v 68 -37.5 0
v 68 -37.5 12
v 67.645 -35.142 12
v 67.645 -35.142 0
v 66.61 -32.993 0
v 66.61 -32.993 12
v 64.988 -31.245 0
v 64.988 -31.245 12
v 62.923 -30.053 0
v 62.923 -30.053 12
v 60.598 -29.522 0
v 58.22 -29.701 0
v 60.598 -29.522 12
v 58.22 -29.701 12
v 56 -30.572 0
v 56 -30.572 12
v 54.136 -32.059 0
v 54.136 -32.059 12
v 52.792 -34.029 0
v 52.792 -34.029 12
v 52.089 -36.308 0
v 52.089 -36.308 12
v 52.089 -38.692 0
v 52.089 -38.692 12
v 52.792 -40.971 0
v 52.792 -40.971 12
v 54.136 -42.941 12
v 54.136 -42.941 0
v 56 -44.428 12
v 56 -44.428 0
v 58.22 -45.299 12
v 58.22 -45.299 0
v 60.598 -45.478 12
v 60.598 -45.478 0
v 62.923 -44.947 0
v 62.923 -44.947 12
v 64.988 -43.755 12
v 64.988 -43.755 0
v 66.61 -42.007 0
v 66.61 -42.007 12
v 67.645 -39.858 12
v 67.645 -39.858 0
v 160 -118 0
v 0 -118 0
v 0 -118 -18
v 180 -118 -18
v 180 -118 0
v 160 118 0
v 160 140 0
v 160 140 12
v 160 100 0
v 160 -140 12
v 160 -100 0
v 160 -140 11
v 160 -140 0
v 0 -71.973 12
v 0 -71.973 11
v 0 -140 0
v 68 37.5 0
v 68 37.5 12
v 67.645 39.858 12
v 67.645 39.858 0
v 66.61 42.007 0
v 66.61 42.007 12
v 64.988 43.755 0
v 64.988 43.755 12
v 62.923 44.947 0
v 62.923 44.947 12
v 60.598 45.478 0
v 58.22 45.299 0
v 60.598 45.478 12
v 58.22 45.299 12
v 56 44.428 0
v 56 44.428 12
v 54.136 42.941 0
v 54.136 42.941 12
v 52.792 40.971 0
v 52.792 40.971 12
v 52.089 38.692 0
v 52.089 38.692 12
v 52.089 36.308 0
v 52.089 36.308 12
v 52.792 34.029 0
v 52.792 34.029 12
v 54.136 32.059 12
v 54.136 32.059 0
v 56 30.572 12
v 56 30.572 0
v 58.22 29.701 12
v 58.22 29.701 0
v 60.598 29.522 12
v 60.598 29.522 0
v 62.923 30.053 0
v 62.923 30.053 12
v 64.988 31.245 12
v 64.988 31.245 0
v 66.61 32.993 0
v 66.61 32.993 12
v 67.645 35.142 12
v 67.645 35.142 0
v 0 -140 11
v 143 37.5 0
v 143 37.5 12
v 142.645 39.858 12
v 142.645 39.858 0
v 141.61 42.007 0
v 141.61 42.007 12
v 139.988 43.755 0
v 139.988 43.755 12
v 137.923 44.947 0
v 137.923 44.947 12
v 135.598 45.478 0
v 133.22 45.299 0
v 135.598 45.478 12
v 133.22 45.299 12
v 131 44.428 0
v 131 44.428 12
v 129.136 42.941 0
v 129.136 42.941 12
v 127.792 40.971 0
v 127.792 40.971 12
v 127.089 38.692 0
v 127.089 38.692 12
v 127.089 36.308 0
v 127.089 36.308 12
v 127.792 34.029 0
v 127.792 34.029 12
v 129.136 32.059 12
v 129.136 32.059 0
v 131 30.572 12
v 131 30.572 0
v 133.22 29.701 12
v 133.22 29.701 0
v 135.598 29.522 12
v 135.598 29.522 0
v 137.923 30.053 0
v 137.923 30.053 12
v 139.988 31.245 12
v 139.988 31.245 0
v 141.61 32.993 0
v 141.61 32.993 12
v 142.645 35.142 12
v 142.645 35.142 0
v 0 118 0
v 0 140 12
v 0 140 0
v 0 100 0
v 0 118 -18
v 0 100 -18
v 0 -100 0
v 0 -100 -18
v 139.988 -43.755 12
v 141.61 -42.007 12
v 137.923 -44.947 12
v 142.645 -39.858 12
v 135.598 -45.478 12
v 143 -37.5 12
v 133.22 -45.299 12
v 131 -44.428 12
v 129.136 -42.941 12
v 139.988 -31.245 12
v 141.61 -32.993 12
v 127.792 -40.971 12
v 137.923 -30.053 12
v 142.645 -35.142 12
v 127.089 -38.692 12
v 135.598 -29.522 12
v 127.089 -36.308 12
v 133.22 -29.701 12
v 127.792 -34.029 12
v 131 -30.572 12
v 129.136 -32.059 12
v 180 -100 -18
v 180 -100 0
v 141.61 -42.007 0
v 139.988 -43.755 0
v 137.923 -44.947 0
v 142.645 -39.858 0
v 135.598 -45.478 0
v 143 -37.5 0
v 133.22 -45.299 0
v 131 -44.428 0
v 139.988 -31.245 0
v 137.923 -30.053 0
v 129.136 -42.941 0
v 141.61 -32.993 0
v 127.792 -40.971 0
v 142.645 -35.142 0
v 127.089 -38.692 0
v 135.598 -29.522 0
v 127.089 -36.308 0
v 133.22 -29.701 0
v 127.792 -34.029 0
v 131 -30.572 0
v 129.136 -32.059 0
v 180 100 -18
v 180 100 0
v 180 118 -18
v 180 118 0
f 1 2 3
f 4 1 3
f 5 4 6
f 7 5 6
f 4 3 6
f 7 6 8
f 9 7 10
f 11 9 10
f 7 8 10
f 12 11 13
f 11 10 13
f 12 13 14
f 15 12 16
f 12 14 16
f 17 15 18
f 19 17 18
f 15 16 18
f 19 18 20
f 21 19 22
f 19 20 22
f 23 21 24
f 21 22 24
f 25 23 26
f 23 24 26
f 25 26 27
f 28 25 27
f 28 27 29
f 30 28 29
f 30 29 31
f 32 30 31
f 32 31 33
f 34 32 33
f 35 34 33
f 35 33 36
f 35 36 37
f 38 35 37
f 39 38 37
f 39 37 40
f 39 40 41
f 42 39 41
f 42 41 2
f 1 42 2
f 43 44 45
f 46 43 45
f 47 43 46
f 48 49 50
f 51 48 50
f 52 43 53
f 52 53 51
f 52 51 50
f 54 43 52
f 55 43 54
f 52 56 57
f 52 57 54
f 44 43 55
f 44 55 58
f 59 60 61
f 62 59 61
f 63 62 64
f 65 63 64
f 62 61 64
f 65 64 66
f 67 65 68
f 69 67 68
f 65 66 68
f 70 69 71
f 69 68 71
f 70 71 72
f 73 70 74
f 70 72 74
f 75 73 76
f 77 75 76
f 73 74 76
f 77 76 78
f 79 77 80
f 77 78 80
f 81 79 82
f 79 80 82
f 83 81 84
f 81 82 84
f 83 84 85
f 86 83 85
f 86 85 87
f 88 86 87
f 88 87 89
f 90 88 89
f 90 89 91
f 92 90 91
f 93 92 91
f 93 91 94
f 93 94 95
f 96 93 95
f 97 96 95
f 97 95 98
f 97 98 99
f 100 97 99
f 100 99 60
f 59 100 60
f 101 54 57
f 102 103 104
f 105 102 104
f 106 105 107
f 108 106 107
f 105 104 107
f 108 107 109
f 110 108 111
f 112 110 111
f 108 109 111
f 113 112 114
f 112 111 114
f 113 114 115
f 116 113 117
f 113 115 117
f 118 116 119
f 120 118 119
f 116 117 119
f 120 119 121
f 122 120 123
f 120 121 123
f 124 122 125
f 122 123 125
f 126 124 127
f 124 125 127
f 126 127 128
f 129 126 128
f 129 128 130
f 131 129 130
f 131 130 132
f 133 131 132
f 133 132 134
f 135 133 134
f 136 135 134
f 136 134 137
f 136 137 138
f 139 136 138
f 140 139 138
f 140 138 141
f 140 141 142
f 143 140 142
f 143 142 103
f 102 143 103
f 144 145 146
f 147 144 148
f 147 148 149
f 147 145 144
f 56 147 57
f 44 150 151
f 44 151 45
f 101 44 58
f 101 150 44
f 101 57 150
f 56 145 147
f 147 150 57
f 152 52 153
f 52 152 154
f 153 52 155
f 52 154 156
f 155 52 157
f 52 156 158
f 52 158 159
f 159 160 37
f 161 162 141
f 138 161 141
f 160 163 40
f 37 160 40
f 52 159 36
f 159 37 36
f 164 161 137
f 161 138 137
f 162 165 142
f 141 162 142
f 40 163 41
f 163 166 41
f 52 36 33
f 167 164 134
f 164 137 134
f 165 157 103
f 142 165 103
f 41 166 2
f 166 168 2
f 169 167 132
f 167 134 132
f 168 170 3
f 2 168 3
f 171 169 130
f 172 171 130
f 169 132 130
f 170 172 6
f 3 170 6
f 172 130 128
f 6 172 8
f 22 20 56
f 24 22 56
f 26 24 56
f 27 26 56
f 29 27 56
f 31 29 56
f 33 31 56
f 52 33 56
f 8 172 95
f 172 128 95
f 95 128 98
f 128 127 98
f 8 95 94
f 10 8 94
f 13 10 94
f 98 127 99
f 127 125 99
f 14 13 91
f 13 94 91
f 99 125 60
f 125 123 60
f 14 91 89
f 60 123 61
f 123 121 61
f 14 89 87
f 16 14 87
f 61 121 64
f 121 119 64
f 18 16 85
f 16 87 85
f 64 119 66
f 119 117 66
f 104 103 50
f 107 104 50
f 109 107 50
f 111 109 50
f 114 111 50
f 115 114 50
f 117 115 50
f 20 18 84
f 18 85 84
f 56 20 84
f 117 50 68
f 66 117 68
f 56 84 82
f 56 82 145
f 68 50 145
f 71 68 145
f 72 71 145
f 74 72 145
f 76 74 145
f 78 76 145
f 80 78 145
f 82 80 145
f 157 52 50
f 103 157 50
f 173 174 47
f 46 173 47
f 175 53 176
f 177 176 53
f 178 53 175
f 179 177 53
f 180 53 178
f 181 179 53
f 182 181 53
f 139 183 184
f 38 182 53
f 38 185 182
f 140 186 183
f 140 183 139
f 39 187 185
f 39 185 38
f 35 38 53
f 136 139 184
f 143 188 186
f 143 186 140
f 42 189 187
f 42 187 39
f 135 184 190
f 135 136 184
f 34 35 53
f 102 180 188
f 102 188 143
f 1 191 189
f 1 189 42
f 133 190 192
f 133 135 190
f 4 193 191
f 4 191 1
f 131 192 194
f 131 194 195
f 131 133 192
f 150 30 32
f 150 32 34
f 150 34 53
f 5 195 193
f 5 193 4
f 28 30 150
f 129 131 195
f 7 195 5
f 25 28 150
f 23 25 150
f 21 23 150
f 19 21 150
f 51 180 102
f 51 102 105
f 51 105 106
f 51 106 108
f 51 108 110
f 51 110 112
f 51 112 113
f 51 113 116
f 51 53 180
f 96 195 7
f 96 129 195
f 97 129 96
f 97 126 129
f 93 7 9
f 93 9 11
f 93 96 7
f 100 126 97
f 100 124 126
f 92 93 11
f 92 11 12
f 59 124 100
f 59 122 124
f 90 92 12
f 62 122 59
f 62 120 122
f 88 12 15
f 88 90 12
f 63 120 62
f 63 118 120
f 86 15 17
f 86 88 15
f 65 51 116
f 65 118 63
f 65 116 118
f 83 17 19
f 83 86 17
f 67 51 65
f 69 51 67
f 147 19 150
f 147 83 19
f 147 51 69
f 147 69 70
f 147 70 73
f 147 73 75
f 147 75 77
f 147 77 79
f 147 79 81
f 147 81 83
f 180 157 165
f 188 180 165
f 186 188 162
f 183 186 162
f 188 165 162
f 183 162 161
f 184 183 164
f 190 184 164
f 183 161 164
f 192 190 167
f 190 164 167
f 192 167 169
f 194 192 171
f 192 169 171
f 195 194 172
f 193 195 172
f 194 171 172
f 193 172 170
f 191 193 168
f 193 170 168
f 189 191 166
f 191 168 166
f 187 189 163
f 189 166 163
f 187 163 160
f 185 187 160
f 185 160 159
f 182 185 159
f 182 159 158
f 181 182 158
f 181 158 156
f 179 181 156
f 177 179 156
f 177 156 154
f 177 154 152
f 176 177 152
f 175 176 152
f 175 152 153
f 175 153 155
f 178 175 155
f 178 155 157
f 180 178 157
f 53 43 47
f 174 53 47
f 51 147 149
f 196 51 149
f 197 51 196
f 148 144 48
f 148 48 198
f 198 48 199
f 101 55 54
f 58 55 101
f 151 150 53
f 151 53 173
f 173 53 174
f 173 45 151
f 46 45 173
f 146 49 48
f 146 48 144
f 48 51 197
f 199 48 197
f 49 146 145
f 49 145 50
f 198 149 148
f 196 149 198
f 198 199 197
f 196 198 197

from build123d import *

# Parameters (mm, degrees)
PAD_DEPTH       = 12
POCKET_DEPTH    = 1
SKETCH003_R     = 8
POCKET001_DEPTH = 12.001
SKETCH004_W     = 180
SKETCH004_H     = 18
PAD001_DEPTH    = 18


with BuildPart() as part:
    # Sketch → Pad (new body)
    with BuildSketch(Plane.XY):
        Polygon((0, 0), (0, 140), (160, 140), (160, -140), (0, -140), align=None)
    extrude(amount=PAD_DEPTH)

    # Sketch002 (on Face7 of Pad) → Pocket (cut)
    with BuildSketch(Plane.XY.offset(12)):
        Polygon((0, -140), (0, -71.973152), (160, -140), align=None)
    extrude(amount=-POCKET_DEPTH, mode=Mode.SUBTRACT)

    # Sketch003 (on Face5 of Pocket) → Pocket001 (cut, through all)
    with BuildSketch(Plane.XY.offset(12)):
        with Locations((60, 37.5)):
            Circle(SKETCH003_R)
        with Locations((135, 37.5)):
            Circle(SKETCH003_R)
        with Locations((135, -37.5)):
            Circle(SKETCH003_R)
        with Locations((60, -37.5)):
            Circle(SKETCH003_R)
    extrude(amount=-POCKET001_DEPTH, mode=Mode.SUBTRACT)

    # Sketch004 (on Face4 of Pocket001) → Pad001 (join)
    with BuildSketch(Plane(origin=(0, 0, 0), x_dir=(1, 0, 0), z_dir=(0, 0, -1))):
        with Locations((90, 109)):
            Rectangle(SKETCH004_W, SKETCH004_H)
        with Locations((90, -109)):
            Rectangle(SKETCH004_W, SKETCH004_H)
    extrude(amount=PAD001_DEPTH)


solid = part.part
